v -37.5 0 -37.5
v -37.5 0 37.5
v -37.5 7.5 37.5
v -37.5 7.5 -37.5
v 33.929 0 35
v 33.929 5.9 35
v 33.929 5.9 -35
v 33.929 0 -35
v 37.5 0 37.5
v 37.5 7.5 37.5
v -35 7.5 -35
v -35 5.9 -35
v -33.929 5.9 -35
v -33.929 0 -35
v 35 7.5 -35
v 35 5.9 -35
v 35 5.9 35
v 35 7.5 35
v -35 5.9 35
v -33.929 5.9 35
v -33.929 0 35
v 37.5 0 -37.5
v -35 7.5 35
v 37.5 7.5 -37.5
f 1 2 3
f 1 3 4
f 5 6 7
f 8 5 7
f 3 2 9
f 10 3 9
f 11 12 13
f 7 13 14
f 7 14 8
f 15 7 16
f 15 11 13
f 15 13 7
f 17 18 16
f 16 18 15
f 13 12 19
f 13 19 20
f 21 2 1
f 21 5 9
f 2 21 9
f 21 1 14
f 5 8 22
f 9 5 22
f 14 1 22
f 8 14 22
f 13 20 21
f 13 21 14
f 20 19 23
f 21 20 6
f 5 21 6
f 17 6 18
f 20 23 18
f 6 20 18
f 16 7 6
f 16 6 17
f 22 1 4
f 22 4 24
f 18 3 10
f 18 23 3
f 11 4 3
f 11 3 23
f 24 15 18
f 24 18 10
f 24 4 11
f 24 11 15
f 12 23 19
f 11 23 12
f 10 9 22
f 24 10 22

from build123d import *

# Parameters (mm, degrees)
SKETCH1_W             = 75
SKETCH1_H             = 75
BASE_DEPTH            = 7.5
SKETCH2_W             = 70
SKETCH2_H             = 70
SLOT_DEPTH            = 1.6
SKETCH3_W             = 67.858008496
SKETCH3_H             = 70
SLOT_COMPONENTS_DEPTH = 5.9


with BuildPart() as part:
    # Sketch1 → Base (new body)
    with BuildSketch(Plane(origin=(0, 0, 0), x_dir=(1, 0, 0), z_dir=(0, 1, 0))):
        Rectangle(SKETCH1_W, SKETCH1_H)
    extrude(amount=BASE_DEPTH)

    # Sketch2 → Slot (cut)
    with BuildSketch(Plane(origin=(0, 7.5, 0), x_dir=(1, 0, 0), z_dir=(0, 1, 0))):
        Rectangle(SKETCH2_W, SKETCH2_H)
    extrude(amount=-SLOT_DEPTH, mode=Mode.SUBTRACT)

    # Sketch3 → Slot-Components (cut)
    with BuildSketch(Plane(origin=(0, 5.9, 0), x_dir=(1, 0, 0), z_dir=(0, 1, 0))):
        Rectangle(SKETCH3_W, SKETCH3_H)
    extrude(amount=-SLOT_COMPONENTS_DEPTH, mode=Mode.SUBTRACT)


solid = part.part
